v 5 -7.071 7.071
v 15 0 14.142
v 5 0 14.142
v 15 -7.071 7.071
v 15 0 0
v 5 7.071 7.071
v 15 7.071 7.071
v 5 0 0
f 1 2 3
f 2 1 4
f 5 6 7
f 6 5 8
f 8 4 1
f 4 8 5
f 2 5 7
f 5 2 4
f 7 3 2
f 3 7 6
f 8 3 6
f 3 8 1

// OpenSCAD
rotate([45.0, 0, 0]) {
  translate([5.0, 0, 0]) {
    cube([10.0, 10.0, 10.0]);
  }
}
$fn = 50;
